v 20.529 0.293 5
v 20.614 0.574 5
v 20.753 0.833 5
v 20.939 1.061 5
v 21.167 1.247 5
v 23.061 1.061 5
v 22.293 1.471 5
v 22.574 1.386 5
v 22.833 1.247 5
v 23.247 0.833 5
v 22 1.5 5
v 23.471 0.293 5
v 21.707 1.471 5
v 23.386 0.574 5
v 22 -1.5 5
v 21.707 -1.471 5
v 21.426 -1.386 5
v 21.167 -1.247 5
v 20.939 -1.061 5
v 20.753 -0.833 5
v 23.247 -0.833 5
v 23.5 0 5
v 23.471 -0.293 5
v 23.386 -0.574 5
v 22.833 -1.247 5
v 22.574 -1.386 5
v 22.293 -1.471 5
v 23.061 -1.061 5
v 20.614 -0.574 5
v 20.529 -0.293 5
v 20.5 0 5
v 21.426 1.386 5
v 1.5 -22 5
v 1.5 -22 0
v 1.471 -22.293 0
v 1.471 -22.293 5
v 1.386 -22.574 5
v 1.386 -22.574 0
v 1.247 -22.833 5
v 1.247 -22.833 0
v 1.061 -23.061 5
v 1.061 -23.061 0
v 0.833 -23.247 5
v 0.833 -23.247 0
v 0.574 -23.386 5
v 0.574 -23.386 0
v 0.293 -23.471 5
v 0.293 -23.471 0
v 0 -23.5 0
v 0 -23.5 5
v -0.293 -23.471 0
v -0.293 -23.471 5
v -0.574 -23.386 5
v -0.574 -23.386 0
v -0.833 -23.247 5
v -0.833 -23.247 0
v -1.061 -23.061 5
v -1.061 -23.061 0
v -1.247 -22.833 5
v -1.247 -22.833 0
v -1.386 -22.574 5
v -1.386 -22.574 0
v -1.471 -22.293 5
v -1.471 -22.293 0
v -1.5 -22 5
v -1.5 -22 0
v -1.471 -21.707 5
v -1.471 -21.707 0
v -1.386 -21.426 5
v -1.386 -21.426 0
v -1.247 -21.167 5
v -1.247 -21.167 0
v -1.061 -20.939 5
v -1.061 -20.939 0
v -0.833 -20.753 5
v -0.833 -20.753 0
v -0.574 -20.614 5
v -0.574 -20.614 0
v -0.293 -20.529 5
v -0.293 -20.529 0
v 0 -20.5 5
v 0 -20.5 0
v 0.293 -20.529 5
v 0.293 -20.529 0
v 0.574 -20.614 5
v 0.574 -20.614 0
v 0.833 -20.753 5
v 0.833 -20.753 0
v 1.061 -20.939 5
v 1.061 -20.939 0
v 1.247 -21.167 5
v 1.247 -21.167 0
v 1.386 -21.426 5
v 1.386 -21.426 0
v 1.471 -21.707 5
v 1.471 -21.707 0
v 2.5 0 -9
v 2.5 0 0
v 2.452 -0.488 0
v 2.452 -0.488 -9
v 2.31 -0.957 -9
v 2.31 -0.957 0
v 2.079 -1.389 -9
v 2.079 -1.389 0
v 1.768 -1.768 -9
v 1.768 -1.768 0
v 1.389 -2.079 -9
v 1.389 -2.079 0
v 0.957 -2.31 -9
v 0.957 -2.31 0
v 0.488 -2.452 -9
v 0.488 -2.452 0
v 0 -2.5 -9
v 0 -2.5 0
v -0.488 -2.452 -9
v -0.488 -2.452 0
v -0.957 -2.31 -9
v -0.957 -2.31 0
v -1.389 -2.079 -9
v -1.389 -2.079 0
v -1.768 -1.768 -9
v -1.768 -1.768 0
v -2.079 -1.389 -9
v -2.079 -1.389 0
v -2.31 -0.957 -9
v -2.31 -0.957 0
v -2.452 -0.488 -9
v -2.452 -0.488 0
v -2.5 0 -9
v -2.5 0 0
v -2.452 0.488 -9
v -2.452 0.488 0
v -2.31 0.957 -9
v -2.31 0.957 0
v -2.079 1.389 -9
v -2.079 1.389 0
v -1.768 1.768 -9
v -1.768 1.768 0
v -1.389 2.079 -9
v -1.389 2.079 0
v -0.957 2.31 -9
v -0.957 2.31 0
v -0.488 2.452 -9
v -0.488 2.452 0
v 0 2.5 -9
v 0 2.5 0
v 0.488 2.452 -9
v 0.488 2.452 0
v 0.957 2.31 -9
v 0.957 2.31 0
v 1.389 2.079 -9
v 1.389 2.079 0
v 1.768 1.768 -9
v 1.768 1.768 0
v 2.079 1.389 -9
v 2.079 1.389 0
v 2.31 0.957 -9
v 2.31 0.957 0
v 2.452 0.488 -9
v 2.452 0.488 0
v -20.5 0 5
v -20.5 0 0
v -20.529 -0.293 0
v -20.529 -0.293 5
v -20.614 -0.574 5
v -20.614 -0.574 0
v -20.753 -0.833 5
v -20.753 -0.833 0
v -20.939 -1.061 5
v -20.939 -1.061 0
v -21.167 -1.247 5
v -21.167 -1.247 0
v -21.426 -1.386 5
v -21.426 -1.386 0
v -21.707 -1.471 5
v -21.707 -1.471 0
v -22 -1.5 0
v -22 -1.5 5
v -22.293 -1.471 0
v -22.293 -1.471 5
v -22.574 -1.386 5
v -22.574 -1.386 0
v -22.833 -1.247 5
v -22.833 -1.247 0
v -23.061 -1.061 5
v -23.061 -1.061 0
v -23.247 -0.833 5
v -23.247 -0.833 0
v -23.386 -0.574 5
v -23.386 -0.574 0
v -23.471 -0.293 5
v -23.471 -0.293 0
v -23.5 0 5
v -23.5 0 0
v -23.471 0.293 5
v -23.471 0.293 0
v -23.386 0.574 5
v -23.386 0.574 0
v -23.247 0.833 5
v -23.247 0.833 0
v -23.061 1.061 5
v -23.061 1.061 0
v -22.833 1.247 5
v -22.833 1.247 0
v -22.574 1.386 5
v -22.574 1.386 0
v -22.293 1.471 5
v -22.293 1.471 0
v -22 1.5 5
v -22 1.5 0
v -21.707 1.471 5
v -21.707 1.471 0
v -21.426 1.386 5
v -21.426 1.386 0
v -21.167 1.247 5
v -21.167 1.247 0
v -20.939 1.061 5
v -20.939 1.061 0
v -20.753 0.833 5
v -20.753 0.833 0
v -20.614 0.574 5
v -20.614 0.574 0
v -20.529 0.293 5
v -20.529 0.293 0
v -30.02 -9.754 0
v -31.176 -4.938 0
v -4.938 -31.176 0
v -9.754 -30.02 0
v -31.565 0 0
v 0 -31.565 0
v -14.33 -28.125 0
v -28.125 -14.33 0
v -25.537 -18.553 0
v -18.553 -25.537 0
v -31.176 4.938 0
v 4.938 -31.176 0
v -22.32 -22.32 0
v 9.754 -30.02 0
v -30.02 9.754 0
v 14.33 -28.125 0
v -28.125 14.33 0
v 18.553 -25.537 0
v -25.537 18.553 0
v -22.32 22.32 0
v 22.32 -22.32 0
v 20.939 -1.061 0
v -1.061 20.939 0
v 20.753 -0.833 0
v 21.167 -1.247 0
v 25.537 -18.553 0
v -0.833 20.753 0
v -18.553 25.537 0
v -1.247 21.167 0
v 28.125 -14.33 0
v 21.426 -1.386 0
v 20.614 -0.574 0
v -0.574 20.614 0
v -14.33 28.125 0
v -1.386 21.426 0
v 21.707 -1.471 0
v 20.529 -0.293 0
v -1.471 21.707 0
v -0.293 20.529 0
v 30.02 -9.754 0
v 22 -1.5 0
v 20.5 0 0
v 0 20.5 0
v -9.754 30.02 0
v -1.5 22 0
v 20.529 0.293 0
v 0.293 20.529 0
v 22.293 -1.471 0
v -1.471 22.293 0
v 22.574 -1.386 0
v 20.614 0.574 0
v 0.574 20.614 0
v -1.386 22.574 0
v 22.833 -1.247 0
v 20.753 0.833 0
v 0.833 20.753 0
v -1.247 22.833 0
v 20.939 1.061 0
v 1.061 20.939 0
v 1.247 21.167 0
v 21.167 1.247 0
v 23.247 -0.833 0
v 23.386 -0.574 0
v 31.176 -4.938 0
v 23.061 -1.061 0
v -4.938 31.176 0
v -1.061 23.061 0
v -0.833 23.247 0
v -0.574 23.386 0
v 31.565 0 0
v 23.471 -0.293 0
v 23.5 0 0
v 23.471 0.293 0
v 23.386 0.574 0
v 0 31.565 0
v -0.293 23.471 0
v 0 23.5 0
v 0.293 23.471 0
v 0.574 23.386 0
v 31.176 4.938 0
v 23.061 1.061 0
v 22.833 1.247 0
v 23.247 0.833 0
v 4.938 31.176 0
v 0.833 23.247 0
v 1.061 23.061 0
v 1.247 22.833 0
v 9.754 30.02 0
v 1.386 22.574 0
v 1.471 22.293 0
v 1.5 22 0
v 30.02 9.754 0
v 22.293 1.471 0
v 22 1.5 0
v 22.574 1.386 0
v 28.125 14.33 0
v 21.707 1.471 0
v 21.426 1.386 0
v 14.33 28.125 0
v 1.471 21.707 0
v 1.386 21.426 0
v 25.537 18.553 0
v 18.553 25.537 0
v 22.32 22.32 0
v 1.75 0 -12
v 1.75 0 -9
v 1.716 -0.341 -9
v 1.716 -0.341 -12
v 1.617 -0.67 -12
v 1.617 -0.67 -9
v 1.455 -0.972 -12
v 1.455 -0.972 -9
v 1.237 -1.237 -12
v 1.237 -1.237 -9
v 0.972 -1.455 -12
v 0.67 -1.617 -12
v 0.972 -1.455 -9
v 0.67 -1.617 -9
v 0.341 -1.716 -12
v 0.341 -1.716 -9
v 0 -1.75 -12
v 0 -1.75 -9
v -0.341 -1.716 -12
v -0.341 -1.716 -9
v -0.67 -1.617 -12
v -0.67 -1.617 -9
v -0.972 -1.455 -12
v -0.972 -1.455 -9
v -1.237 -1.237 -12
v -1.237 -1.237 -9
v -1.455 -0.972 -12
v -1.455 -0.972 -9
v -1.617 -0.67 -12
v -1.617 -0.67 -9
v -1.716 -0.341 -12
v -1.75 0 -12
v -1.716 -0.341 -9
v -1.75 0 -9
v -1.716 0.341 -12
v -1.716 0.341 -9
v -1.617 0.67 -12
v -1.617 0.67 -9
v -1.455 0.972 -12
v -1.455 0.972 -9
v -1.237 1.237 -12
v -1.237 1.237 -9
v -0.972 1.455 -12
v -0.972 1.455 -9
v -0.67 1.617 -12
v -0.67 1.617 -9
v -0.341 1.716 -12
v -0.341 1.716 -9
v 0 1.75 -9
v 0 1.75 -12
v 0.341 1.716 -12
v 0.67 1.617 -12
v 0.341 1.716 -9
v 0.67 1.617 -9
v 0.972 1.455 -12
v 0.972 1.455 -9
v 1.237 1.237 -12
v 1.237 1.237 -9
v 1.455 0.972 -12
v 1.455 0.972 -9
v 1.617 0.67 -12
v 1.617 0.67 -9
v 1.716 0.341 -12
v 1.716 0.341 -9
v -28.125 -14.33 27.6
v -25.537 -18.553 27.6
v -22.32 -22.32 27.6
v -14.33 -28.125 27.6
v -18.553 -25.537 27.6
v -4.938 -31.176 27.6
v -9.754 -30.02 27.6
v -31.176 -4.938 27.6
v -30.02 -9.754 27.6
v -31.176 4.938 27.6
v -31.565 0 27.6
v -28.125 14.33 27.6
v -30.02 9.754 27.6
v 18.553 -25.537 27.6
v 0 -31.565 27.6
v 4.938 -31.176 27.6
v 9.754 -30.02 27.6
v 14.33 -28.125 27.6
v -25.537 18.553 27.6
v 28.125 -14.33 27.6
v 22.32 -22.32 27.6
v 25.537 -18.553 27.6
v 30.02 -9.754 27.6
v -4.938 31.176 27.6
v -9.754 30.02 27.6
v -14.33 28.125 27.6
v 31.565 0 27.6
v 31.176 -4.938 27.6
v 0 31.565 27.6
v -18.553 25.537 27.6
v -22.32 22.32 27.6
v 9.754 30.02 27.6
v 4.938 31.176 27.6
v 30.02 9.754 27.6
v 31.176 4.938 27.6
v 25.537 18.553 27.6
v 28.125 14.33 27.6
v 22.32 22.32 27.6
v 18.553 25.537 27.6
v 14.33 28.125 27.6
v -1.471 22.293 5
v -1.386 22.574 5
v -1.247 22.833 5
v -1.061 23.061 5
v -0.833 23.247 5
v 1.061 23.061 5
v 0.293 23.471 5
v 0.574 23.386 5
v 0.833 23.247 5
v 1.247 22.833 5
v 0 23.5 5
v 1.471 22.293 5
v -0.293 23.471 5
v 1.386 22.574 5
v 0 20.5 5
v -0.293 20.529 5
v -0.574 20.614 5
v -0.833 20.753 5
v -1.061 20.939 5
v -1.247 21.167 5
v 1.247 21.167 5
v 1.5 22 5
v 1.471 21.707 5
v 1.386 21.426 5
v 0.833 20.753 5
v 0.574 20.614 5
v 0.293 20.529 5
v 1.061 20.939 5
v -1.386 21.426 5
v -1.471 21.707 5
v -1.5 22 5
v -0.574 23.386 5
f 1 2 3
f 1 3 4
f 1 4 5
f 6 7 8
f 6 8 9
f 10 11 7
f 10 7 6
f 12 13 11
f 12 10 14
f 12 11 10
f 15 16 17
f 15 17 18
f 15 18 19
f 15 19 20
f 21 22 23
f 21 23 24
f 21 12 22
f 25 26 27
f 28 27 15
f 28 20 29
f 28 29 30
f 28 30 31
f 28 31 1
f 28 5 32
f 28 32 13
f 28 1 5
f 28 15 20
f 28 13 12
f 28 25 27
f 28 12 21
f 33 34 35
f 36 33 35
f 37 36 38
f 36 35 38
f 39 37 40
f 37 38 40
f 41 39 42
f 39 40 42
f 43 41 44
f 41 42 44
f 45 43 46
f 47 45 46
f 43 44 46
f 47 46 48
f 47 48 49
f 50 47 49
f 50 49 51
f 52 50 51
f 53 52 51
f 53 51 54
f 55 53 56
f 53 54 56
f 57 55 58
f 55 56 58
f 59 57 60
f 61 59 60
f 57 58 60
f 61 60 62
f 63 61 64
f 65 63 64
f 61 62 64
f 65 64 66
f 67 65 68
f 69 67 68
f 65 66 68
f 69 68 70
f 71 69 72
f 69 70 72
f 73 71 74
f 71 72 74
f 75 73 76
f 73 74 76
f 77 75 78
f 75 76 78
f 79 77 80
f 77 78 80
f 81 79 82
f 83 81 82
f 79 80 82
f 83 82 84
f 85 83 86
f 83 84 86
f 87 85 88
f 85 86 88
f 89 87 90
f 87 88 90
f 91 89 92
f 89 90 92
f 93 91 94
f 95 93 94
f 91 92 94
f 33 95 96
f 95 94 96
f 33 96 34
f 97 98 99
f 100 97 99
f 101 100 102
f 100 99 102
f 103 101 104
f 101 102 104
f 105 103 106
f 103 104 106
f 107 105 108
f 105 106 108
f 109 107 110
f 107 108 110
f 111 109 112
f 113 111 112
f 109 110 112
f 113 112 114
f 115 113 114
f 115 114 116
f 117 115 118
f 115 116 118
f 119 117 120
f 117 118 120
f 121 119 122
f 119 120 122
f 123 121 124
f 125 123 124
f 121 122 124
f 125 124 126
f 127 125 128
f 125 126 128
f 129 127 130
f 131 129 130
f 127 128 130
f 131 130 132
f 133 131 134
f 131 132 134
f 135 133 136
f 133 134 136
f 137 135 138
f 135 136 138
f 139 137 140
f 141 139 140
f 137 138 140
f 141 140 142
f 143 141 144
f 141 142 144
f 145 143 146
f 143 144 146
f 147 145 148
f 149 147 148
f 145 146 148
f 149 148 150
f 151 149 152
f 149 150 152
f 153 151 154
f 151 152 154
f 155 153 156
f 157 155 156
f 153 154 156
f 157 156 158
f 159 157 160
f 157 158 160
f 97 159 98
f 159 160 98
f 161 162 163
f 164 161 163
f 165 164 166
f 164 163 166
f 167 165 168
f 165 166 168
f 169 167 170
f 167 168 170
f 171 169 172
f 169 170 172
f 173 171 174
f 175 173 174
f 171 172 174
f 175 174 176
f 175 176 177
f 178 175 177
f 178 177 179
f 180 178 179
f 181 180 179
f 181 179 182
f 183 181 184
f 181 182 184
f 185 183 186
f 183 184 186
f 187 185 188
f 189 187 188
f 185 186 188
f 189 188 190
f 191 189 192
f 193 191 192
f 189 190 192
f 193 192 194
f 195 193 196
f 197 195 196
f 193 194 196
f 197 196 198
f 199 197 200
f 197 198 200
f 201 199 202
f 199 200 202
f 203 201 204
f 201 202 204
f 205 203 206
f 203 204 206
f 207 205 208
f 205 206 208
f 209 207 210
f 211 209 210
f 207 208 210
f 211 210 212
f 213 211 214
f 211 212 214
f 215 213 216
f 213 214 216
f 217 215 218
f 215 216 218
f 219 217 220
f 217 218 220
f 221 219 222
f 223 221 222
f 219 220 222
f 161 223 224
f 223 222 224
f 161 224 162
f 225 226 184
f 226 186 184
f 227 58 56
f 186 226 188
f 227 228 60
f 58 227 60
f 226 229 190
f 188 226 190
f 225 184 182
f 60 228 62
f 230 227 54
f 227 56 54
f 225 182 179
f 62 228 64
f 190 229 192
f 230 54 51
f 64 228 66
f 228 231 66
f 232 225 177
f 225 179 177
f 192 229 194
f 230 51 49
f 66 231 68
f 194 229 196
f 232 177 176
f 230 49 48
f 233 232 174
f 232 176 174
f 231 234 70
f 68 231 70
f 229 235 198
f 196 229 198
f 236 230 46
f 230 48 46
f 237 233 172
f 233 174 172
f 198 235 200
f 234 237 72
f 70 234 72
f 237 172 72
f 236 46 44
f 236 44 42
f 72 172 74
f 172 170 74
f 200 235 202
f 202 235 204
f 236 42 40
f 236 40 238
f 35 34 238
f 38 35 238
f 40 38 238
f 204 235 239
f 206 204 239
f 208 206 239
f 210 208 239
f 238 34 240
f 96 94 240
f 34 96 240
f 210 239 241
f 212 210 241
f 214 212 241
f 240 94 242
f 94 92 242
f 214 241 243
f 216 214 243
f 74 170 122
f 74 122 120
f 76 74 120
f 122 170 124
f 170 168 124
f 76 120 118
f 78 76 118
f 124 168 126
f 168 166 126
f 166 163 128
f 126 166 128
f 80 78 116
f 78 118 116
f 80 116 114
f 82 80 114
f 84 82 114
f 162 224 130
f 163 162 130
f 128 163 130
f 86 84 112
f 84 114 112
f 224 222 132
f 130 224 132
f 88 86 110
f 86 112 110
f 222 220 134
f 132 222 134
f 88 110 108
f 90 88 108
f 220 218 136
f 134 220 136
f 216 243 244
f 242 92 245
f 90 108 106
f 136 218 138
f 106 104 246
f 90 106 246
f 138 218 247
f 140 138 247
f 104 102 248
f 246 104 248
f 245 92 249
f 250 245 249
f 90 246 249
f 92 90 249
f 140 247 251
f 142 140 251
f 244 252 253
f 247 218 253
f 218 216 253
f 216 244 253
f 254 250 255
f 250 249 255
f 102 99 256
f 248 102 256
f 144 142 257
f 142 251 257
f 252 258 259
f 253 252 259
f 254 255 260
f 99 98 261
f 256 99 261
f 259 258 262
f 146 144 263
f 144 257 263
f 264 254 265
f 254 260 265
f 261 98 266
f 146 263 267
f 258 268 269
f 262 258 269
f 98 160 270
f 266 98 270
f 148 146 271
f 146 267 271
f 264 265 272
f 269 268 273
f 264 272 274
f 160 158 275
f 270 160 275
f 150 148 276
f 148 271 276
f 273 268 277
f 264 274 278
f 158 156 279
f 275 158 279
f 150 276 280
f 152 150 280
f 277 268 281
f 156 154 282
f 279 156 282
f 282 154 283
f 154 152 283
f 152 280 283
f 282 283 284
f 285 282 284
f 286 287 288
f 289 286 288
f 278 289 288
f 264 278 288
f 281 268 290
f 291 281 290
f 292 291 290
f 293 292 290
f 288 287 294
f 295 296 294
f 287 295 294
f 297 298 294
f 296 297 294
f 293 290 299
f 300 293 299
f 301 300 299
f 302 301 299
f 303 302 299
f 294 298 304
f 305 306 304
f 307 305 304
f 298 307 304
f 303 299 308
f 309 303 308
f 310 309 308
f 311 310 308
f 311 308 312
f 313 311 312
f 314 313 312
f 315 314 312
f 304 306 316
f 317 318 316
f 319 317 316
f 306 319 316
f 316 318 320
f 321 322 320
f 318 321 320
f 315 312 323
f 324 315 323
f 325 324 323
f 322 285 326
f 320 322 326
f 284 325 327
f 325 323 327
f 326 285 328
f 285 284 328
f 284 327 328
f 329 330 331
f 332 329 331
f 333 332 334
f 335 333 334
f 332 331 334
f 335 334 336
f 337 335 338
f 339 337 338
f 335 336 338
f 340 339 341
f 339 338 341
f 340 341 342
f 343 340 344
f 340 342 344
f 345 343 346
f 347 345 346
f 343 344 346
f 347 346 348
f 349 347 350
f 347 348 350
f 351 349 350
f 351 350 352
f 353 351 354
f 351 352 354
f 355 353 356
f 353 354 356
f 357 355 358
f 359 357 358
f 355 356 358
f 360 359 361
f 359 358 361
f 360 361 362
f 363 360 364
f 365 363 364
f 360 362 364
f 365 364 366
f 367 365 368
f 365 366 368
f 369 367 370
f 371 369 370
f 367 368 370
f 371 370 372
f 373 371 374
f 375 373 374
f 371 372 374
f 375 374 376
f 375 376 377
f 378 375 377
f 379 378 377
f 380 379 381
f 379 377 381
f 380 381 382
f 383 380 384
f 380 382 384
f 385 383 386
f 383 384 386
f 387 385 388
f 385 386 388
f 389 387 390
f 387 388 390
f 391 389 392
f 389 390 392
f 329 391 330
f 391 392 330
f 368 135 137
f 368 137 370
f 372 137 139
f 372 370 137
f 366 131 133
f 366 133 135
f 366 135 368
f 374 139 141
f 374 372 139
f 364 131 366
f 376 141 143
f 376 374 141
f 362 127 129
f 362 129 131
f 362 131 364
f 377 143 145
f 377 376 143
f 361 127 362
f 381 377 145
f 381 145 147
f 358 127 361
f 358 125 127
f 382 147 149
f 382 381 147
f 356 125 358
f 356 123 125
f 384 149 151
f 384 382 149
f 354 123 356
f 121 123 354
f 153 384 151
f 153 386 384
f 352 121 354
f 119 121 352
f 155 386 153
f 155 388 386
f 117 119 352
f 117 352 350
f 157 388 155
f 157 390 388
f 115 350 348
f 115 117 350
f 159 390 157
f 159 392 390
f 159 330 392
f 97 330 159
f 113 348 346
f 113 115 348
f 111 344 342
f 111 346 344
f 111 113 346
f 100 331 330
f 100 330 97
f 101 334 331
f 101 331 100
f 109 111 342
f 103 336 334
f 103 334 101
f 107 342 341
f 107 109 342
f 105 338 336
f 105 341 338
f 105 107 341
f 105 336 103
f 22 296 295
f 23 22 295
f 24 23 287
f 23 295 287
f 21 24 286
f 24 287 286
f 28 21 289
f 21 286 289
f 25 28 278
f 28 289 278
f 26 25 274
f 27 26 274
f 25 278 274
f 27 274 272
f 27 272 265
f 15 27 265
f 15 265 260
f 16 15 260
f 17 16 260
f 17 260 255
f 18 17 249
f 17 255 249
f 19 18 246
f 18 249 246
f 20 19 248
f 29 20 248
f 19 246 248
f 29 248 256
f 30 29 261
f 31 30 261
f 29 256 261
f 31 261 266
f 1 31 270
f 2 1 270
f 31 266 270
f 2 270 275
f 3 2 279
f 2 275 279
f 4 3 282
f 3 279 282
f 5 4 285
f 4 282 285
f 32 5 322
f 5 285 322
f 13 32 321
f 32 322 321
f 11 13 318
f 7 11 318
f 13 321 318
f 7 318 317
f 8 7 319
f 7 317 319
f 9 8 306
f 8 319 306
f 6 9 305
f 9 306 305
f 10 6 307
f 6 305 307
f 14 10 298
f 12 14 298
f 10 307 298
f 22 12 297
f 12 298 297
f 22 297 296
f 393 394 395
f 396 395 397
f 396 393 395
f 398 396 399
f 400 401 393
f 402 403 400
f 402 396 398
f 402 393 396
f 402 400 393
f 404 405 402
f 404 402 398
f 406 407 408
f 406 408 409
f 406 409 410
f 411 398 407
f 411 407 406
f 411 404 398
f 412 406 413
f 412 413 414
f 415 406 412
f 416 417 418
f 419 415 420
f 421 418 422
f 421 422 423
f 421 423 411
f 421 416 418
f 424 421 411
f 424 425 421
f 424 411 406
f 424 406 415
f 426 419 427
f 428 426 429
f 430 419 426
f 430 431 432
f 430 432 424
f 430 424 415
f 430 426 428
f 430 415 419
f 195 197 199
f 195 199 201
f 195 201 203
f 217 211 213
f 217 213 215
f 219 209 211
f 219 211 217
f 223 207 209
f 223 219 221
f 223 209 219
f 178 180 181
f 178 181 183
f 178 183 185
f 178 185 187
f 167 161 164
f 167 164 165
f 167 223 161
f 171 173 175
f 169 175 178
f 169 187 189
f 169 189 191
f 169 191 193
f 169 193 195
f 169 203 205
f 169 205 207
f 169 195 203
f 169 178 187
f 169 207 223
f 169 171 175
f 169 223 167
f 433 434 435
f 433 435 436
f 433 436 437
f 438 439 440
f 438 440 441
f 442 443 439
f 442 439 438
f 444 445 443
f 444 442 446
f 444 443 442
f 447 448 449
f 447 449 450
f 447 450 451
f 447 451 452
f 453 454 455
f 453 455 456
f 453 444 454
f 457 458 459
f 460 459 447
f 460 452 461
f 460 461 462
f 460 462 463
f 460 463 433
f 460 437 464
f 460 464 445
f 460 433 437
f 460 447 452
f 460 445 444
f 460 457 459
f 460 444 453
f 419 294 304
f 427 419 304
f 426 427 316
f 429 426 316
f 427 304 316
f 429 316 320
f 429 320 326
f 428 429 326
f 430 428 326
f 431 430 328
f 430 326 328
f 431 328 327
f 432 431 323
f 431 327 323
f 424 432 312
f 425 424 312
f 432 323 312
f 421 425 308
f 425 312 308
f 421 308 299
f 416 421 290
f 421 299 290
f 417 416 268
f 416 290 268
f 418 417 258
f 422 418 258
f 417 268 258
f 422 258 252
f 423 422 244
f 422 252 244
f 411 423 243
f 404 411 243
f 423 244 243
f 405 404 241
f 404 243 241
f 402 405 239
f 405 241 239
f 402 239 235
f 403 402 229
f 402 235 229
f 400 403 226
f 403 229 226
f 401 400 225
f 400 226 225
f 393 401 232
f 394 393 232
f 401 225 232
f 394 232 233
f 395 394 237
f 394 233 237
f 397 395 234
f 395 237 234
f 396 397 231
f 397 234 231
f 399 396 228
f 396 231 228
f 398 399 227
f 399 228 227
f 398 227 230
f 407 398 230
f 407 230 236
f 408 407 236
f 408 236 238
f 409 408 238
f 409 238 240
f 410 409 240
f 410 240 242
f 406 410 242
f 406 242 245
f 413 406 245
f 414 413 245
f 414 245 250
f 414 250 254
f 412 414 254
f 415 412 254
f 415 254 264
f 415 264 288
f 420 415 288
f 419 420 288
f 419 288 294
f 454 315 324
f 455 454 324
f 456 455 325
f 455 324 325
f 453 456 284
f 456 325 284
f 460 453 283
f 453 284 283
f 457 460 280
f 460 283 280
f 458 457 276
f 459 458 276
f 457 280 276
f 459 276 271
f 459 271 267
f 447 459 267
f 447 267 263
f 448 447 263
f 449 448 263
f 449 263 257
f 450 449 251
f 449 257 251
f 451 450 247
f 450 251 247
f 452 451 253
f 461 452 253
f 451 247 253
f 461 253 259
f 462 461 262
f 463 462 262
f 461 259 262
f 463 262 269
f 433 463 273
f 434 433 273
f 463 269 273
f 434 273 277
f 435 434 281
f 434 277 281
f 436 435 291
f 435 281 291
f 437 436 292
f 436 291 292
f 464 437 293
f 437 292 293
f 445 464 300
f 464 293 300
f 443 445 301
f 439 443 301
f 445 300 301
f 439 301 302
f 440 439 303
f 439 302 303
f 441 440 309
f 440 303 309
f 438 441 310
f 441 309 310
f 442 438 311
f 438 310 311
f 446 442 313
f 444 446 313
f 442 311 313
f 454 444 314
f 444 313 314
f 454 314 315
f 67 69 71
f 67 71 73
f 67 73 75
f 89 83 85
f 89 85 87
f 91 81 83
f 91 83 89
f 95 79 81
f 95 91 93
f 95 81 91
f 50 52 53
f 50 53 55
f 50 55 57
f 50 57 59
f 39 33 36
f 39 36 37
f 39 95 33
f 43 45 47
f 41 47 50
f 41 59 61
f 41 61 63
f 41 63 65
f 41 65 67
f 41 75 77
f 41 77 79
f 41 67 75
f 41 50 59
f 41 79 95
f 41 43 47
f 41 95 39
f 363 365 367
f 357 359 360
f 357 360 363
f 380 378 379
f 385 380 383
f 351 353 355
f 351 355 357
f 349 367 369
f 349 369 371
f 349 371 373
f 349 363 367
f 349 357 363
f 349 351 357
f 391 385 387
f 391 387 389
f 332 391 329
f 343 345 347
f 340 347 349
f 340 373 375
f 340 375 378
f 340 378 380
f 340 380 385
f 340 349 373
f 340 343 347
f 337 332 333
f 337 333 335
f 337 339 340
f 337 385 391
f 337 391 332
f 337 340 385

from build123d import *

# Parameters (mm, degrees)
F0_R     = 31.565
F1_DEPTH = 27.6
F2_R     = 2.5
F3_DEPTH = 9
F4_R     = 1.75
F5_DEPTH = 3
F6_R     = 1.5
F7_DEPTH = 5


with BuildPart() as f1:
    # F0 (on Top) → F1 (new body)
    with BuildSketch(Plane.XY):
        Circle(F0_R)
    extrude(amount=F1_DEPTH)

    # F2 (on face) → F3 (join)
    with BuildSketch(Plane(origin=(0, 0, 0), x_dir=(1, 0, 0), z_dir=(0, 0, -1))):
        Circle(F2_R)
    extrude(amount=F3_DEPTH)

    # F4 (on face) → F5 (join)
    with BuildSketch(Plane(origin=(0, 0, -9), x_dir=(1, 0, 0), z_dir=(0, 0, -1))):
        Circle(F4_R)
    extrude(amount=F5_DEPTH)

    # F6 (on face) → F7 (cut)
    with BuildSketch(Plane(origin=(0, 0, 0), x_dir=(1, 0, 0), z_dir=(0, 0, -1))):
        with Locations((0, 22)):
            Circle(F6_R)
        with Locations((0, -22)):
            Circle(F6_R)
        with Locations((-22, 0)):
            Circle(F6_R)
        with Locations((22, 0)):
            Circle(F6_R)
    extrude(amount=-F7_DEPTH, mode=Mode.SUBTRACT)


solid = f1.part
